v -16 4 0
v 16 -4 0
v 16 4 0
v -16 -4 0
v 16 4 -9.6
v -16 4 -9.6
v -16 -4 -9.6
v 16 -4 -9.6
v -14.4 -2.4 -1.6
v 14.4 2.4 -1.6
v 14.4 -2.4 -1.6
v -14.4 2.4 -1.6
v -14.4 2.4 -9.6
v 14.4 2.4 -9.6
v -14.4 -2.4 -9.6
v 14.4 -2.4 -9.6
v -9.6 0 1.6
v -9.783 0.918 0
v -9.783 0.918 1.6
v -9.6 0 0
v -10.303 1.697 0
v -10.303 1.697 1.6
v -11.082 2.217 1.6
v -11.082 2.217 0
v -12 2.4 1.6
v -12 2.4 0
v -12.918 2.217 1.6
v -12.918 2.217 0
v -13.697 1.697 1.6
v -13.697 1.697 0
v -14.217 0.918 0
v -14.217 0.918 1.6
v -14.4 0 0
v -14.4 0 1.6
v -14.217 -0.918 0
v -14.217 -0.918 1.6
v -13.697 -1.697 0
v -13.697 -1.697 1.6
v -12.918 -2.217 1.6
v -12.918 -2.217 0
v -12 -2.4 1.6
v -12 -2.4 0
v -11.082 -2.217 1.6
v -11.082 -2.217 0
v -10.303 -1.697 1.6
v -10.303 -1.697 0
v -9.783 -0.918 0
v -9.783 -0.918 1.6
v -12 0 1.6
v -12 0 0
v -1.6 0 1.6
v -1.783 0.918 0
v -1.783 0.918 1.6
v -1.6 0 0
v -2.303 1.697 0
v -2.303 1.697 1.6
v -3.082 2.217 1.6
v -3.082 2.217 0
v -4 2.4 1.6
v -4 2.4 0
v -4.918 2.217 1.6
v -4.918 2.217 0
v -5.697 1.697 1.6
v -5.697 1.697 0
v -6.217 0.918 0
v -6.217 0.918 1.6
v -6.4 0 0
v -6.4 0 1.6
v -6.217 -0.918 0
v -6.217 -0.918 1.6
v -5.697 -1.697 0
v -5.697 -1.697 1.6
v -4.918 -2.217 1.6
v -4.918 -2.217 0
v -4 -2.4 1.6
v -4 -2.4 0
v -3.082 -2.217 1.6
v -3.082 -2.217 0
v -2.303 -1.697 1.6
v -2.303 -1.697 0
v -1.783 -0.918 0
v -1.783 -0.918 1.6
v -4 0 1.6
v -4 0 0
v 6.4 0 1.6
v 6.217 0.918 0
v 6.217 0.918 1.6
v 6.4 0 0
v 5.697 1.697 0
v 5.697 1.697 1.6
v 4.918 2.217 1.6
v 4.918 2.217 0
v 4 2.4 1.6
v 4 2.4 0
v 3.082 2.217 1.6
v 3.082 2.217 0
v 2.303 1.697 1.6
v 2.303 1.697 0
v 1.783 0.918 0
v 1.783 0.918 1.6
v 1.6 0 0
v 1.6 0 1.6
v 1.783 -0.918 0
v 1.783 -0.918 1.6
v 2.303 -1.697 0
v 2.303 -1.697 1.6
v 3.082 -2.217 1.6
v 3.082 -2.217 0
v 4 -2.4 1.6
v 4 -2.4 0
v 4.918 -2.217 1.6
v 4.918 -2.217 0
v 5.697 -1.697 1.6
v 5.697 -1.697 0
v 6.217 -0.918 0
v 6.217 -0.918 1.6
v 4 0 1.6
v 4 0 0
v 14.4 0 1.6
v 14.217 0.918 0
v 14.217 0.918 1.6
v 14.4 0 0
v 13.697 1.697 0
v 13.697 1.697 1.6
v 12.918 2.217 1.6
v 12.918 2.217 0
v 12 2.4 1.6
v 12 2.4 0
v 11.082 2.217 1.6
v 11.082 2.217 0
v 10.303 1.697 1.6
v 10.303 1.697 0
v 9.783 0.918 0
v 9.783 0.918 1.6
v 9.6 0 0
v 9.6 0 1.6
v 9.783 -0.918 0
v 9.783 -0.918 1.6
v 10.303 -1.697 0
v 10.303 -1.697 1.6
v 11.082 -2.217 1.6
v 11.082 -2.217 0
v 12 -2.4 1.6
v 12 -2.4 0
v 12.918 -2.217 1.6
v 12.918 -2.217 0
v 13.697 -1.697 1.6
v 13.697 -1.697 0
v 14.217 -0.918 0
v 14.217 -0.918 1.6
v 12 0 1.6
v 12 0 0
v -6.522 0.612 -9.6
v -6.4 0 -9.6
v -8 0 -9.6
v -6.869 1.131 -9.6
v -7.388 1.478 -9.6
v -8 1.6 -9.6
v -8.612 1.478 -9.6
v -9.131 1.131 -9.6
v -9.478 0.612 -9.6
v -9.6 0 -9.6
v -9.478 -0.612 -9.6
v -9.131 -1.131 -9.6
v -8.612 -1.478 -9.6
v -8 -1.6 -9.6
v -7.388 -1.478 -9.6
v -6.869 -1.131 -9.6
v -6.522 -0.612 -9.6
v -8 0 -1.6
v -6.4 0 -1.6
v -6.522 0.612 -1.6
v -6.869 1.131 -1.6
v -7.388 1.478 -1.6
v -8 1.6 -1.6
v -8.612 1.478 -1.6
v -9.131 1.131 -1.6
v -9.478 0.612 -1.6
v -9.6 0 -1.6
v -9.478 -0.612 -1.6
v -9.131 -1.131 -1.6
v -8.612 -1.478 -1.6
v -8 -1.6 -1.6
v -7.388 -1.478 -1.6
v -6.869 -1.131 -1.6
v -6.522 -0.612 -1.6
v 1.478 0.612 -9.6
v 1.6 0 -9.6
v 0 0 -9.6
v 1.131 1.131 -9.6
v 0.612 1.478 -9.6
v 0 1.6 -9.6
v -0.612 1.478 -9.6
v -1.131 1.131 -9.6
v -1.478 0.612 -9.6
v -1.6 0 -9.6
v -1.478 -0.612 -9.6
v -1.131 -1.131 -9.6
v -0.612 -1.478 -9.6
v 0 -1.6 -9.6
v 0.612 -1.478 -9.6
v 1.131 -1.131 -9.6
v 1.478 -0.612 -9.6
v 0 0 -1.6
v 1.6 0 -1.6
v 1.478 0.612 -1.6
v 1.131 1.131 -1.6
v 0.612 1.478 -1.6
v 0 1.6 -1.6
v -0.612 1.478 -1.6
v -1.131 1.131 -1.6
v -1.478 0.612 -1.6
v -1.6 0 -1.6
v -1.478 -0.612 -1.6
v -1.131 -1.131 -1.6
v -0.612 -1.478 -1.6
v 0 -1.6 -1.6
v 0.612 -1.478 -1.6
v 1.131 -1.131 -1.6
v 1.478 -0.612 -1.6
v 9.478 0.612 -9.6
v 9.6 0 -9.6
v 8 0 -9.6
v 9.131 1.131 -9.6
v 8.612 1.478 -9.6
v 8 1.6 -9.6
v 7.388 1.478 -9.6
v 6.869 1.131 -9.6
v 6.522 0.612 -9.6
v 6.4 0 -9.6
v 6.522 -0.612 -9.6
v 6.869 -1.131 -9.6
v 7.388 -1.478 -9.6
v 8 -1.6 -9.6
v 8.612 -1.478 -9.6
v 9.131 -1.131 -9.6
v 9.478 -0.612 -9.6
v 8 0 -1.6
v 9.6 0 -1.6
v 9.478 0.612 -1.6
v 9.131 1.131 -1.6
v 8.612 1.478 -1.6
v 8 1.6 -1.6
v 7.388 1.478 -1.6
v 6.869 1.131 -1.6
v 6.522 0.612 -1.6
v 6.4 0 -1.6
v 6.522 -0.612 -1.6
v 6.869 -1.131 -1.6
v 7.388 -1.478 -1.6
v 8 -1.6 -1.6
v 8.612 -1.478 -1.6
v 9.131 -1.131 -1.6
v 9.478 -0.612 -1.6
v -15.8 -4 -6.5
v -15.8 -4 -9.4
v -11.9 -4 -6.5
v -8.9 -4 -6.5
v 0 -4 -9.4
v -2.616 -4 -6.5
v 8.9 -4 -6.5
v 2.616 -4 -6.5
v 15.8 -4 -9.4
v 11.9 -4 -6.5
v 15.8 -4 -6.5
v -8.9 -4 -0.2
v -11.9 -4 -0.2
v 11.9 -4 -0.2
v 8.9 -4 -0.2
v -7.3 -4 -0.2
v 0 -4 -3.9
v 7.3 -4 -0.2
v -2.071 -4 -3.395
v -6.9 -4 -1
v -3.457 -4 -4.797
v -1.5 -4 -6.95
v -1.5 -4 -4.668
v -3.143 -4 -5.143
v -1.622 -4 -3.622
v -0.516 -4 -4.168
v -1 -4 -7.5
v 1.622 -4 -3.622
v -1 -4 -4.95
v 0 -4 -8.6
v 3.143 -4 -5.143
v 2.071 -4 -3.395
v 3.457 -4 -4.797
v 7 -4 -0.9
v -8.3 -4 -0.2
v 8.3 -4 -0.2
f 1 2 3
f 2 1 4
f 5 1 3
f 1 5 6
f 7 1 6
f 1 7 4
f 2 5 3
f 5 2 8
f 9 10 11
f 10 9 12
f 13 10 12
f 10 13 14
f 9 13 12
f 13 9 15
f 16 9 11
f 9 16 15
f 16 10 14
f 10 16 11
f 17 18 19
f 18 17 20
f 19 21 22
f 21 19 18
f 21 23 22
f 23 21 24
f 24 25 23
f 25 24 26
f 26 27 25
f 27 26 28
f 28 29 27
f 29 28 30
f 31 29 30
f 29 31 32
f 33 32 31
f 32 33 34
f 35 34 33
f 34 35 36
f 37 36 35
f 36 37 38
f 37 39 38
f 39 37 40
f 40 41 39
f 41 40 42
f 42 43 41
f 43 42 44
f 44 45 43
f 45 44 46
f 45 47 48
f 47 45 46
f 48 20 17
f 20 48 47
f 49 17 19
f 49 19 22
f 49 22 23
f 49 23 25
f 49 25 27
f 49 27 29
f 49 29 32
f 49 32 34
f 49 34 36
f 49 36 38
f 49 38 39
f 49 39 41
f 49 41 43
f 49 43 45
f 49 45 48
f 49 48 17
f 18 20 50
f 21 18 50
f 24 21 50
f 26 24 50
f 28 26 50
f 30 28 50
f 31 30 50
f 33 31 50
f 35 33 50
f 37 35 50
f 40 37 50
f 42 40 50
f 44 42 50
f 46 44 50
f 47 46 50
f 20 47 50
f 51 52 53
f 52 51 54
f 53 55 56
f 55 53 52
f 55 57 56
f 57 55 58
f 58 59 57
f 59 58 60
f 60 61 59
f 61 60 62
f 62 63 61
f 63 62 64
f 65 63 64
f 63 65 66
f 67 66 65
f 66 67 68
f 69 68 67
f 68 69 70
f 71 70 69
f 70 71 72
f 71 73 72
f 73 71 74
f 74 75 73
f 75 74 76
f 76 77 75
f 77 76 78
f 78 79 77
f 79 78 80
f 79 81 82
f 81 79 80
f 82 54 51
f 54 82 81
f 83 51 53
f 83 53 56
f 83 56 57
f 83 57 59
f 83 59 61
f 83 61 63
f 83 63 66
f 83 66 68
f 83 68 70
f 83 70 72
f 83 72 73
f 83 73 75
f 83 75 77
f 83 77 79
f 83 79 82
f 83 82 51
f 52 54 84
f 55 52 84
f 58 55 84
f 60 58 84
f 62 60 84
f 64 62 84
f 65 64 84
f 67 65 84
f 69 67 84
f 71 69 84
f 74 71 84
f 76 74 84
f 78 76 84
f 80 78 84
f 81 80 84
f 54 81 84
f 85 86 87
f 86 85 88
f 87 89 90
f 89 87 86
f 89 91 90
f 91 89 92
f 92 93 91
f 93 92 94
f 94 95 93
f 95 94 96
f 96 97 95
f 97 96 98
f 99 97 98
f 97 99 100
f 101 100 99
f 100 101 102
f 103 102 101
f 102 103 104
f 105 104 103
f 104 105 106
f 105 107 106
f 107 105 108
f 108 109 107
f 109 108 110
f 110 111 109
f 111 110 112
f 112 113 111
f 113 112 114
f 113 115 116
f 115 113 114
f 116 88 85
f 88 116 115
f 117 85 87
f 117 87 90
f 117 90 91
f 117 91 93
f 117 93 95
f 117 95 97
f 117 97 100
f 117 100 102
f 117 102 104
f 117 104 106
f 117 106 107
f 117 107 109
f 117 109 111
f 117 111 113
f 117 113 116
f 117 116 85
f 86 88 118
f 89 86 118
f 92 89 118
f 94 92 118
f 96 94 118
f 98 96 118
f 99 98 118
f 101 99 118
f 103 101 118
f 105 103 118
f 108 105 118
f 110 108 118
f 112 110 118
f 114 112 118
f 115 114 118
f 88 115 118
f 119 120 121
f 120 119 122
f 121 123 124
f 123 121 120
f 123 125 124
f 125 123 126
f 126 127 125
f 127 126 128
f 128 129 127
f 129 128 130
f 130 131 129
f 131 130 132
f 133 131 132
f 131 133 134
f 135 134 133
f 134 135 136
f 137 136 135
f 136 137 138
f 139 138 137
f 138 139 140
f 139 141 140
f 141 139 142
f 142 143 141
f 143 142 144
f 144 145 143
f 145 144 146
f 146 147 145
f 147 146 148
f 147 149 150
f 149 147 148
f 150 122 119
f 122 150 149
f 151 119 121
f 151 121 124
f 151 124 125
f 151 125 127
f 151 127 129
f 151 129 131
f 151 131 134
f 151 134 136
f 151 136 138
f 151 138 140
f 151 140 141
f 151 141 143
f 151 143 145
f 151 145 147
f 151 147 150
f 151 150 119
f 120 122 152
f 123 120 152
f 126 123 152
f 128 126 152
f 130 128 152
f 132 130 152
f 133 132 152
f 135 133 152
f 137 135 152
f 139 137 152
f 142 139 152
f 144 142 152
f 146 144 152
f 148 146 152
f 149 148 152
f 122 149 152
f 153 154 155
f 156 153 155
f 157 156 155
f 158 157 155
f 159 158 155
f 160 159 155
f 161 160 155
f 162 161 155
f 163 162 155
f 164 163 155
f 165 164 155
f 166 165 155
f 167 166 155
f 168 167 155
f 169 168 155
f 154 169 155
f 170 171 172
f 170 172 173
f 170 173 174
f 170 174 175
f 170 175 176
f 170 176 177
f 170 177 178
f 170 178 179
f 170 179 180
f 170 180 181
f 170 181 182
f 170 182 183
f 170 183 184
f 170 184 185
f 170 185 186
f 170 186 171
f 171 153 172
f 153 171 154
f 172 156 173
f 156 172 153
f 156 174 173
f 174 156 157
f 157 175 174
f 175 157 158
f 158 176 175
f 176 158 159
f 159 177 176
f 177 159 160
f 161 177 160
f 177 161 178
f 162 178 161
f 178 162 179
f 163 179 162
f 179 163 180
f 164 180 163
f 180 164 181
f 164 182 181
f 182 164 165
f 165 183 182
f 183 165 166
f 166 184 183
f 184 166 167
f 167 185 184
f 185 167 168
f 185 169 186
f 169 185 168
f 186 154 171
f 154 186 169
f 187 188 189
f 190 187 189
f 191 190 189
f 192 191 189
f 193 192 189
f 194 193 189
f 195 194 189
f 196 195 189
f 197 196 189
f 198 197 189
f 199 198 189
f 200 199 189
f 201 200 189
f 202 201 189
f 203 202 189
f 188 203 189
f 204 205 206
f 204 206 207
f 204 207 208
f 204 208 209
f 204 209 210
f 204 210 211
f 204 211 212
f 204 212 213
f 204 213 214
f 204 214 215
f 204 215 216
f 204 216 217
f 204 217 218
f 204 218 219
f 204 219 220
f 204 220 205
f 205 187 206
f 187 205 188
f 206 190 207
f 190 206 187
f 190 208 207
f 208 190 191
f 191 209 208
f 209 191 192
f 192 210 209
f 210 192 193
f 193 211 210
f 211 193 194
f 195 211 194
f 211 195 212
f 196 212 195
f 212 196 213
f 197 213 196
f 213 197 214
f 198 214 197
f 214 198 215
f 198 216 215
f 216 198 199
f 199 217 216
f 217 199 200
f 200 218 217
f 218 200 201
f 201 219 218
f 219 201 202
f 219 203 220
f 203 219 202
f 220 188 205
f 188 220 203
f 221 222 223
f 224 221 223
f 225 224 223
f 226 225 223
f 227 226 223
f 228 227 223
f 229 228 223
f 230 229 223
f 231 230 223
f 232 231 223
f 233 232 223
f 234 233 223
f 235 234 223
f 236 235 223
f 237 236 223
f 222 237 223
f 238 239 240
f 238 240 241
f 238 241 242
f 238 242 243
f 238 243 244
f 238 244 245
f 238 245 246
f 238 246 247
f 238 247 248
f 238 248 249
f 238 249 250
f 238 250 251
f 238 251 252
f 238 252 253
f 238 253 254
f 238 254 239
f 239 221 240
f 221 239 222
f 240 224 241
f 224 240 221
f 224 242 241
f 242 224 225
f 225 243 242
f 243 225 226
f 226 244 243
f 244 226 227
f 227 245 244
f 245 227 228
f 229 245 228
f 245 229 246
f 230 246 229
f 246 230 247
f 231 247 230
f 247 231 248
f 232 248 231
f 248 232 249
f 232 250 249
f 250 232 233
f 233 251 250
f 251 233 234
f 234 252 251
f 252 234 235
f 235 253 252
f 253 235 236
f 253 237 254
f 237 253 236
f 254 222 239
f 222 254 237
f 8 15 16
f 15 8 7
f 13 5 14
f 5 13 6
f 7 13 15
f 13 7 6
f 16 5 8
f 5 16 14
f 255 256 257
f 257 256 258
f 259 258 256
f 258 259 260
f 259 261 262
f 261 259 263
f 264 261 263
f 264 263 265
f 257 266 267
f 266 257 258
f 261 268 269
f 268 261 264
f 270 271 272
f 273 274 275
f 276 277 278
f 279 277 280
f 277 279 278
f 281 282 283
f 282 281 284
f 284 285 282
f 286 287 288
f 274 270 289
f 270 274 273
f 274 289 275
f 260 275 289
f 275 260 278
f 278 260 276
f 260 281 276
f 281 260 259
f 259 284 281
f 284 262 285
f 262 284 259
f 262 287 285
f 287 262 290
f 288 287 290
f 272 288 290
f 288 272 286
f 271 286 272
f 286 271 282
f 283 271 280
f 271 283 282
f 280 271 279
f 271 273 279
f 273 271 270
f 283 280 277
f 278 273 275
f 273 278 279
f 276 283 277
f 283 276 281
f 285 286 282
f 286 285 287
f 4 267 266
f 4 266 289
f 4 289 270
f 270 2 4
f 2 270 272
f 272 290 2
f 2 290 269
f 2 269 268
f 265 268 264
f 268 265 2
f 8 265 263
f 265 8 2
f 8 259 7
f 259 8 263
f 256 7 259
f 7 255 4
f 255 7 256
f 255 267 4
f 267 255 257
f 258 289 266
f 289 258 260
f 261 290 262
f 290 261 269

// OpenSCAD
// file: ../p/4-4edge.scad
use <../lib.scad>
function ldraw_lib__4_4edge() = [
// 0 Circle 1.0
// 0 Name: 4-4edge.dat
// 0 Author: James Jessiman
// 0 !LDRAW_ORG Primitive UPDATE 2017-01
// 0 !LICENSE Licensed under CC BY 2.0 and CC BY 4.0 : see CAreadme.txt
// 
// 0 BFC CERTIFY CCW
  [0,"BFC","CERTIFY"],
  [0,"BFC","CCW"],
// 
// 0 !HISTORY 1998-12-15 [PTadmin] Official Update 1998-10
// 0 !HISTORY 2005-12-28 [PTadmin] Official Update 2005-01
// 0 !HISTORY 2007-06-24 [PTadmin] Header formatted for Contributor Agreement
// 0 !HISTORY 2008-07-01 [PTadmin] Official Update 2008-01
// 0 !HISTORY 2017-01-15 [Steffen] BFCed
// 0 !HISTORY 2017-12-30 [PTadmin] Official Update 2017-01
// 
// 
// 2 24 1 0 0 0.9239 0 0.3827
  [2,24,1,0,0,0.9239,0,0.3827],
// 2 24 0.9239 0 0.3827 0.7071 0 0.7071
  [2,24,0.9239,0,0.3827,0.7071,0,0.7071],
// 2 24 0.7071 0 0.7071 0.3827 0 0.9239
  [2,24,0.7071,0,0.7071,0.3827,0,0.9239],
// 2 24 0.3827 0 0.9239 0 0 1
  [2,24,0.3827,0,0.9239,0,0,1],
// 2 24 0 0 1 -0.3827 0 0.9239
  [2,24,0,0,1,-0.3827,0,0.9239],
// 2 24 -0.3827 0 0.9239 -0.7071 0 0.7071
  [2,24,-0.3827,0,0.9239,-0.7071,0,0.7071],
// 2 24 -0.7071 0 0.7071 -0.9239 0 0.3827
  [2,24,-0.7071,0,0.7071,-0.9239,0,0.3827],
// 2 24 -0.9239 0 0.3827 -1 0 -0
  [2,24,-0.9239,0,0.3827,-1,0,-0],
// 2 24 -1 0 -0 -0.9239 0 -0.3827
  [2,24,-1,0,-0,-0.9239,0,-0.3827],
// 2 24 -0.9239 0 -0.3827 -0.7071 0 -0.7071
  [2,24,-0.9239,0,-0.3827,-0.7071,0,-0.7071],
// 2 24 -0.7071 0 -0.7071 -0.3827 0 -0.9239
  [2,24,-0.7071,0,-0.7071,-0.3827,0,-0.9239],
// 2 24 -0.3827 0 -0.9239 0 0 -1
  [2,24,-0.3827,0,-0.9239,0,0,-1],
// 2 24 0 0 -1 0.3827 0 -0.9239
  [2,24,0,0,-1,0.3827,0,-0.9239],
// 2 24 0.3827 0 -0.9239 0.7071 0 -0.7071
  [2,24,0.3827,0,-0.9239,0.7071,0,-0.7071],
// 2 24 0.7071 0 -0.7071 0.9239 0 -0.3827
  [2,24,0.7071,0,-0.7071,0.9239,0,-0.3827],
// 2 24 0.9239 0 -0.3827 1 0 0
  [2,24,0.9239,0,-0.3827,1,0,0],
];
module ldraw_lib__4_4edge(step=0, col=false, unit=2/5, alt=false, line=0.2, solid=!$preview)
    makepoly(ldraw_lib__4_4edge(), step=step, col=col, unit=unit, alt=alt, line=line, solid=solid);
ldraw_lib__4_4edge(line=0.2);
// file: ../p/4-4disc.scad
use <../lib.scad>
function ldraw_lib__4_4disc() = [
// 0 Disc 1.0
// 0 Name: 4-4disc.dat
// 0 Author: James Jessiman
// 0 !LDRAW_ORG Primitive UPDATE 2002-02
// 0 !LICENSE Licensed under CC BY 2.0 and CC BY 4.0 : see CAreadme.txt
// 
// 0 BFC CERTIFY CCW
  [0,"BFC","CERTIFY"],
  [0,"BFC","CCW"],
// 
// 0 !HISTORY 1998-12-15 [PTadmin] Official Update 1998-10
// 0 !HISTORY 2002-03-23 [sbliss] Added BFC statement
// 0 !HISTORY 2002-04-25 [PTadmin] Official Update 2002-02
// 0 !HISTORY 2007-06-24 [PTadmin] Header formatted for Contributor Agreement
// 0 !HISTORY 2008-07-01 [PTadmin] Official Update 2008-01
// 
// 
// 3 16 0 0 0 1 0 0 0.9239 0 0.3827
  [3,16,0,0,0,1,0,0,0.9239,0,0.3827],
// 3 16 0 0 0 0.9239 0 0.3827 0.7071 0 0.7071
  [3,16,0,0,0,0.9239,0,0.3827,0.7071,0,0.7071],
// 3 16 0 0 0 0.7071 0 0.7071 0.3827 0 0.9239
  [3,16,0,0,0,0.7071,0,0.7071,0.3827,0,0.9239],
// 3 16 0 0 0 0.3827 0 0.9239 0 0 1
  [3,16,0,0,0,0.3827,0,0.9239,0,0,1],
// 3 16 0 0 0 0 0 1 -0.3827 0 0.9239
  [3,16,0,0,0,0,0,1,-0.3827,0,0.9239],
// 3 16 0 0 0 -0.3827 0 0.9239 -0.7071 0 0.7071
  [3,16,0,0,0,-0.3827,0,0.9239,-0.7071,0,0.7071],
// 3 16 0 0 0 -0.7071 0 0.7071 -0.9239 0 0.3827
  [3,16,0,0,0,-0.7071,0,0.7071,-0.9239,0,0.3827],
// 3 16 0 0 0 -0.9239 0 0.3827 -1 0 -0
  [3,16,0,0,0,-0.9239,0,0.3827,-1,0,-0],
// 3 16 0 0 0 -1 0 -0 -0.9239 0 -0.3827
  [3,16,0,0,0,-1,0,-0,-0.9239,0,-0.3827],
// 3 16 0 0 0 -0.9239 0 -0.3827 -0.7071 0 -0.7071
  [3,16,0,0,0,-0.9239,0,-0.3827,-0.7071,0,-0.7071],
// 3 16 0 0 0 -0.7071 0 -0.7071 -0.3827 0 -0.9239
  [3,16,0,0,0,-0.7071,0,-0.7071,-0.3827,0,-0.9239],
// 3 16 0 0 0 -0.3827 0 -0.9239 0 0 -1
  [3,16,0,0,0,-0.3827,0,-0.9239,0,0,-1],
// 3 16 0 0 0 0 0 -1 0.3827 0 -0.9239
  [3,16,0,0,0,0,0,-1,0.3827,0,-0.9239],
// 3 16 0 0 0 0.3827 0 -0.9239 0.7071 0 -0.7071
  [3,16,0,0,0,0.3827,0,-0.9239,0.7071,0,-0.7071],
// 3 16 0 0 0 0.7071 0 -0.7071 0.9239 0 -0.3827
  [3,16,0,0,0,0.7071,0,-0.7071,0.9239,0,-0.3827],
// 3 16 0 0 0 0.9239 0 -0.3827 1 0 0
  [3,16,0,0,0,0.9239,0,-0.3827,1,0,0],
// 0
];
module ldraw_lib__4_4disc(step=0, col=false, unit=2/5, alt=false, line=0.2, solid=!$preview)
    makepoly(ldraw_lib__4_4disc(), step=step, col=col, unit=unit, alt=alt, line=line, solid=solid);
ldraw_lib__4_4disc(line=0.2);
// file: ../p/4-4cyli.scad
use <../lib.scad>
$fa=1; $fs=0.2;
function ldraw_lib__4_4cyli(realsolid=false) = [
// 0 Cylinder 1.0
// 0 Name: 4-4cyli.dat
// 0 Author: James Jessiman
// 0 !LDRAW_ORG Primitive UPDATE 2005-01
// 0 !LICENSE Licensed under CC BY 2.0 and CC BY 4.0 : see CAreadme.txt
// 
// 0 BFC CERTIFY CCW
  [0,"BFC","CERTIFY"],
  [0,"BFC","CCW"],
// 
// 0 !HISTORY 1998-12-15 [PTadmin] Official Update 1998-10
// 0 !HISTORY 2002-03-23 [sbliss] Added BFC statement; merged headers from files in distributions LDraw 0.27 and Complete.
// 0 !HISTORY 2002-04-25 [PTadmin] Official Update 2002-02
// 0 !HISTORY 2004-12-14 [guyvivan] BFC CCW
// 0 !HISTORY 2005-12-28 [PTadmin] Official Update 2005-01
// 0 !HISTORY 2007-06-24 [PTadmin] Header formatted for Contributor Agreement
// 0 !HISTORY 2008-07-01 [PTadmin] Official Update 2008-01
// 
// 
// 4 16 1 1 0 0.9239 1 0.3827 0.9239 0 0.3827 1 0 0
  [4,16,1,1,0,0.9239,1,0.3827,0.9239,0,0.3827,1,0,0],
// 5 24 1 0 0 1 1 0 0.9239 0 0.3827 0.9239 0 -0.3827
  [5,24,1,0,0,1,1,0,0.9239,0,0.3827,0.9239,0,-0.3827],
// 4 16 0.9239 1 0.3827 0.7071 1 0.7071 0.7071 0 0.7071 0.9239 0 0.3827
  [4,16,0.9239,1,0.3827,0.7071,1,0.7071,0.7071,0,0.7071,0.9239,0,0.3827],
// 5 24 0.9239 0 0.3827 0.9239 1 0.3827 0.7071 0 0.7071 1 0 0
  [5,24,0.9239,0,0.3827,0.9239,1,0.3827,0.7071,0,0.7071,1,0,0],
// 4 16 0.7071 1 0.7071 0.3827 1 0.9239 0.3827 0 0.9239 0.7071 0 0.7071
  [4,16,0.7071,1,0.7071,0.3827,1,0.9239,0.3827,0,0.9239,0.7071,0,0.7071],
// 5 24 0.7071 0 0.7071 0.7071 1 0.7071 0.3827 0 0.9239 0.9239 0 0.3827
  [5,24,0.7071,0,0.7071,0.7071,1,0.7071,0.3827,0,0.9239,0.9239,0,0.3827],
// 4 16 0.3827 1 0.9239 0 1 1 0 0 1 0.3827 0 0.9239
  [4,16,0.3827,1,0.9239,0,1,1,0,0,1,0.3827,0,0.9239],
// 5 24 0.3827 0 0.9239 0.3827 1 0.9239 0 0 1 0.7071 0 0.7071
  [5,24,0.3827,0,0.9239,0.3827,1,0.9239,0,0,1,0.7071,0,0.7071],
// 4 16 0 1 1 -0.3827 1 0.9239 -0.3827 0 0.9239 0 0 1
  [4,16,0,1,1,-0.3827,1,0.9239,-0.3827,0,0.9239,0,0,1],
// 5 24 0 0 1 0 1 1 -0.3827 0 0.9239 0.3827 0 0.9239
  [5,24,0,0,1,0,1,1,-0.3827,0,0.9239,0.3827,0,0.9239],
// 4 16 -0.3827 1 0.9239 -0.7071 1 0.7071 -0.7071 0 0.7071 -0.3827 0 0.9239
  [4,16,-0.3827,1,0.9239,-0.7071,1,0.7071,-0.7071,0,0.7071,-0.3827,0,0.9239],
// 5 24 -0.3827 0 0.9239 -0.3827 1 0.9239 -0.7071 0 0.7071 0 0 1
  [5,24,-0.3827,0,0.9239,-0.3827,1,0.9239,-0.7071,0,0.7071,0,0,1],
// 4 16 -0.7071 1 0.7071 -0.9239 1 0.3827 -0.9239 0 0.3827 -0.7071 0 0.7071
  [4,16,-0.7071,1,0.7071,-0.9239,1,0.3827,-0.9239,0,0.3827,-0.7071,0,0.7071],
// 5 24 -0.7071 0 0.7071 -0.7071 1 0.7071 -0.9239 0 0.3827 -0.3827 0 0.9239
  [5,24,-0.7071,0,0.7071,-0.7071,1,0.7071,-0.9239,0,0.3827,-0.3827,0,0.9239],
// 4 16 -0.9239 1 0.3827 -1 1 0 -1 0 0 -0.9239 0 0.3827
  [4,16,-0.9239,1,0.3827,-1,1,0,-1,0,0,-0.9239,0,0.3827],
// 5 24 -0.9239 0 0.3827 -0.9239 1 0.3827 -1 0 0 -0.7071 0 0.7071
  [5,24,-0.9239,0,0.3827,-0.9239,1,0.3827,-1,0,0,-0.7071,0,0.7071],
// 4 16 -1 1 0 -0.9239 1 -0.3827 -0.9239 0 -0.3827 -1 0 0
  [4,16,-1,1,0,-0.9239,1,-0.3827,-0.9239,0,-0.3827,-1,0,0],
// 5 24 -1 0 0 -1 1 0 -0.9239 0 -0.3827 -0.9239 0 0.3827
  [5,24,-1,0,0,-1,1,0,-0.9239,0,-0.3827,-0.9239,0,0.3827],
// 4 16 -0.9239 1 -0.3827 -0.7071 1 -0.7071 -0.7071 0 -0.7071 -0.9239 0 -0.3827
  [4,16,-0.9239,1,-0.3827,-0.7071,1,-0.7071,-0.7071,0,-0.7071,-0.9239,0,-0.3827],
// 5 24 -0.9239 0 -0.3827 -0.9239 1 -0.3827 -0.7071 0 -0.7071 -1 0 0
  [5,24,-0.9239,0,-0.3827,-0.9239,1,-0.3827,-0.7071,0,-0.7071,-1,0,0],
// 4 16 -0.7071 1 -0.7071 -0.3827 1 -0.9239 -0.3827 0 -0.9239 -0.7071 0 -0.7071
  [4,16,-0.7071,1,-0.7071,-0.3827,1,-0.9239,-0.3827,0,-0.9239,-0.7071,0,-0.7071],
// 5 24 -0.7071 0 -0.7071 -0.7071 1 -0.7071 -0.3827 0 -0.9239 -0.9239 0 -0.3827
  [5,24,-0.7071,0,-0.7071,-0.7071,1,-0.7071,-0.3827,0,-0.9239,-0.9239,0,-0.3827],
// 4 16 -0.3827 1 -0.9239 0 1 -1 0 0 -1 -0.3827 0 -0.9239
  [4,16,-0.3827,1,-0.9239,0,1,-1,0,0,-1,-0.3827,0,-0.9239],
// 5 24 -0.3827 0 -0.9239 -0.3827 1 -0.9239 0 0 -1 -0.7071 0 -0.7071
  [5,24,-0.3827,0,-0.9239,-0.3827,1,-0.9239,0,0,-1,-0.7071,0,-0.7071],
// 4 16 0 1 -1 0.3827 1 -0.9239 0.3827 0 -0.9239 0 0 -1
  [4,16,0,1,-1,0.3827,1,-0.9239,0.3827,0,-0.9239,0,0,-1],
// 5 24 0 0 -1 0 1 -1 0.3827 0 -0.9239 -0.3827 0 -0.9239
  [5,24,0,0,-1,0,1,-1,0.3827,0,-0.9239,-0.3827,0,-0.9239],
// 4 16 0.3827 1 -0.9239 0.7071 1 -0.7071 0.7071 0 -0.7071 0.3827 0 -0.9239
  [4,16,0.3827,1,-0.9239,0.7071,1,-0.7071,0.7071,0,-0.7071,0.3827,0,-0.9239],
// 5 24 0.3827 0 -0.9239 0.3827 1 -0.9239 0.7071 0 -0.7071 0 0 -1
  [5,24,0.3827,0,-0.9239,0.3827,1,-0.9239,0.7071,0,-0.7071,0,0,-1],
// 4 16 0.7071 1 -0.7071 0.9239 1 -0.3827 0.9239 0 -0.3827 0.7071 0 -0.7071
  [4,16,0.7071,1,-0.7071,0.9239,1,-0.3827,0.9239,0,-0.3827,0.7071,0,-0.7071],
// 5 24 0.7071 0 -0.7071 0.7071 1 -0.7071 0.9239 0 -0.3827 0.3827 0 -0.9239
  [5,24,0.7071,0,-0.7071,0.7071,1,-0.7071,0.9239,0,-0.3827,0.3827,0,-0.9239],
// 4 16 0.9239 1 -0.3827 1 1 0 1 0 0 0.9239 0 -0.3827
  [4,16,0.9239,1,-0.3827,1,1,0,1,0,0,0.9239,0,-0.3827],
// 5 24 0.9239 0 -0.3827 0.9239 1 -0.3827 1 0 0 0.7071 0 -0.7071
  [5,24,0.9239,0,-0.3827,0.9239,1,-0.3827,1,0,0,0.7071,0,-0.7071],
// 0
];
module ldraw_lib__4_4cyli(step=0, col=false, unit=2/5, alt=false, line=0.2, solid=!$preview)
    makepoly(ldraw_lib__4_4cyli(solid), step=step, col=col, unit=unit, alt=alt, line=line, solid=solid);
ldraw_lib__4_4cyli(line=0.2);
// file: ../p/stud3.scad
use <../lib.scad>
use <4-4cyli.scad>
use <4-4disc.scad>
use <4-4edge.scad>
function ldraw_lib__stud3() = [
// 0 Stud Tube Solid
// 0 Name: stud3.dat
// 0 Author: James Jessiman
// 0 !LDRAW_ORG Primitive UPDATE 2012-01
// 0 !LICENSE Licensed under CC BY 4.0 : see CAreadme.txt
// 
// 0 BFC CERTIFY CCW
  [0,"BFC","CERTIFY"],
  [0,"BFC","CCW"],
// 
// 0 !HISTORY 2002-04-04 [sbliss] Modified for BFC compliance
// 0 !HISTORY 2002-04-25 [PTadmin] Official Update 2002-02
// 0 !HISTORY 2007-06-24 [PTadmin] Header formatted for Contributor Agreement
// 0 !HISTORY 2008-07-01 [PTadmin] Official Update 2008-01
// 0 !HISTORY 2012-02-16 [Philo] Changed to CCW
// 0 !HISTORY 2012-03-30 [PTadmin] Official Update 2012-01
// 
// 
// 1 16 0 -4 0 4 0 0 0 1 0 0 0 4 4-4edge.dat
  [1,16,0,-4,0,4,0,0,0,1,0,0,0,4, ldraw_lib__4_4edge()],
// 1 16 0 0 0 4 0 0 0 1 0 0 0 4 4-4edge.dat
  [1,16,0,0,0,4,0,0,0,1,0,0,0,4, ldraw_lib__4_4edge()],
// 1 16 0 -4 0 4 0 0 0 1 0 0 0 4 4-4disc.dat
  [1,16,0,-4,0,4,0,0,0,1,0,0,0,4, ldraw_lib__4_4disc()],
  [-1,16,0,0,0,4,0,0,0,-1,0,0,0,4, ldraw_lib__4_4disc()],
// 1 16 0 -4 0 4 0 0 0 4 0 0 0 4 4-4cyli.dat
  [1,16,0,-4,0,4,0,0,0,4,0,0,0,4, ldraw_lib__4_4cyli()],
];
module ldraw_lib__stud3(step=0, col=false, unit=2/5, alt=false, line=0.2, solid=!$preview)
    makepoly(ldraw_lib__stud3(), step=step, col=col, unit=unit, alt=alt, line=line, solid=solid);
ldraw_lib__stud3(line=0.2);
// file: ../p/stud.scad
use <../lib.scad>
use <4-4cyli.scad>
use <4-4disc.scad>
use <4-4edge.scad>
function ldraw_lib__stud() = [
// 0 Stud
// 0 Name: stud.dat
// 0 Author: James Jessiman
// 0 !LDRAW_ORG Primitive UPDATE 2012-01
// 0 !LICENSE Licensed under CC BY 4.0 : see CAreadme.txt
// 
// 0 BFC CERTIFY CCW
  [0,"BFC","CERTIFY"],
  [0,"BFC","CCW"],
// 
// 0 !HISTORY 2002-04-04 [sbliss] Modified for BFC compliance
// 0 !HISTORY 2002-04-25 [PTadmin] Official Update 2002-02
// 0 !HISTORY 2007-06-24 [PTadmin] Header formatted for Contributor Agreement
// 0 !HISTORY 2008-07-01 [PTadmin] Official Update 2008-01
// 0 !HISTORY 2012-02-16 [Philo] Changed to CCW
// 0 !HISTORY 2012-03-30 [PTadmin] Official Update 2012-01
// 
// 
// 1 16 0 0 0 6 0 0 0 1 0 0 0 6 4-4edge.dat
  [1,16,0,0,0,6,0,0,0,1,0,0,0,6, ldraw_lib__4_4edge()],
// 1 16 0 -4 0 6 0 0 0 1 0 0 0 6 4-4edge.dat
  [1,16,0,-4,0,6,0,0,0,1,0,0,0,6, ldraw_lib__4_4edge()],
// 1 16 0 0 0 6 0 0 0 -4 0 0 0 6 4-4cyli.dat
  [1,16,0,0,0,6,0,0,0,-4,0,0,0,6, ldraw_lib__4_4cyli()],
// 1 16 0 -4 0 6 0 0 0 1 0 0 0 6 4-4disc.dat
  [1,16,0,-4,0,6,0,0,0,1,0,0,0,6, ldraw_lib__4_4disc()],
  [-1,16,0,0,0,6,0,0,0,-1,0,0,0,6, ldraw_lib__4_4disc()],
];
module ldraw_lib__stud(step=0, col=false, unit=2/5, alt=false, line=0.2, solid=!$preview)
    makepoly(ldraw_lib__stud(), step=step, col=col, unit=unit, alt=alt, line=line, solid=solid);
ldraw_lib__stud(line=0.2);
// file: ../p/box5.scad
use <../lib.scad>
function ldraw_lib__box5() = [
// 0 Box with 5 Faces and All Edges
// 0 Name: box5.dat
// 0 Author: James Jessiman
// 0 !LDRAW_ORG Primitive UPDATE 2012-01
// 0 !LICENSE Licensed under CC BY 2.0 and CC BY 4.0 : see CAreadme.txt
// 
// 0 BFC CERTIFY CCW
  [0,"BFC","CERTIFY"],
  [0,"BFC","CCW"],
// 
// 0 !HISTORY 2002-04-03 [sbliss] Modified for BFC compliance
// 0 !HISTORY 2002-04-25 [PTadmin] Official Update 2002-02
// 0 !HISTORY 2007-06-24 [PTadmin] Header formatted for Contributor Agreement
// 0 !HISTORY 2008-07-01 [PTadmin] Official Update 2008-01
// 0 !HISTORY 2012-02-16 [Philo] Changed to CCW
// 0 !HISTORY 2012-03-30 [PTadmin] Official Update 2012-01
// 
// 
// 2 24 1 1 1 -1 1 1
  [2,24,1,1,1,-1,1,1],
// 2 24 -1 1 1 -1 1 -1
  [2,24,-1,1,1,-1,1,-1],
// 2 24 -1 1 -1 1 1 -1
  [2,24,-1,1,-1,1,1,-1],
// 2 24 1 1 -1 1 1 1
  [2,24,1,1,-1,1,1,1],
// 2 24 1 0 1 -1 0 1
  [2,24,1,0,1,-1,0,1],
// 2 24 -1 0 1 -1 0 -1
  [2,24,-1,0,1,-1,0,-1],
// 2 24 -1 0 -1 1 0 -1
  [2,24,-1,0,-1,1,0,-1],
// 2 24 1 0 -1 1 0 1
  [2,24,1,0,-1,1,0,1],
// 2 24 1 0 1 1 1 1
  [2,24,1,0,1,1,1,1],
// 2 24 -1 0 1 -1 1 1
  [2,24,-1,0,1,-1,1,1],
// 2 24 1 0 -1 1 1 -1
  [2,24,1,0,-1,1,1,-1],
// 2 24 -1 0 -1 -1 1 -1
  [2,24,-1,0,-1,-1,1,-1],
// 4 16 -1 1 1 1 1 1 1 1 -1 -1 1 -1
  [4,16,-1,1,1,1,1,1,1,1,-1,-1,1,-1],
// 4 16 -1 1 1 -1 0 1 1 0 1 1 1 1
  [4,16,-1,1,1,-1,0,1,1,0,1,1,1,1],
// 4 16 -1 1 -1 -1 0 -1 -1 0 1 -1 1 1
  [4,16,-1,1,-1,-1,0,-1,-1,0,1,-1,1,1],
// 4 16 1 1 -1 1 0 -1 -1 0 -1 -1 1 -1
  [4,16,1,1,-1,1,0,-1,-1,0,-1,-1,1,-1],
// 4 16 1 1 1 1 0 1 1 0 -1 1 1 -1
  [4,16,1,1,1,1,0,1,1,0,-1,1,1,-1],
];
makepoly(ldraw_lib__box5(), line=0.2);
// file: ../p/box4t.scad
use <../lib.scad>
function ldraw_lib__box4t() = [
// 0 Box with 4 Adjacent Faces and All Edges
// 0 Name: box4t.dat
// 0 Author: Tore Eriksson [Tore_Eriksson]
// 0 !LDRAW_ORG Primitive UPDATE 2003-02
// 0 !LICENSE Licensed under CC BY 2.0 and CC BY 4.0 : see CAreadme.txt
// 
// 0 BFC CERTIFY CCW
  [0,"BFC","CERTIFY"],
  [0,"BFC","CCW"],
// 
// 0 !HISTORY 1997-09-29 [PTadmin] Official Update 1997-15
// 0 !HISTORY 2002-08-31 [izanette] Modified with WINDZ for BFC compliance
// 0 !HISTORY 2003-08-01 [PTadmin] Official Update 2003-02
// 0 !HISTORY 2007-06-24 [PTadmin] Header formatted for Contributor Agreement
// 0 !HISTORY 2008-07-01 [PTadmin] Official Update 2008-01
// 
// 
// 2 24 1 1 1 -1 1 1
  [2,24,1,1,1,-1,1,1],
// 2 24 -1 1 1 -1 1 -1
  [2,24,-1,1,1,-1,1,-1],
// 2 24 -1 1 -1 1 1 -1
  [2,24,-1,1,-1,1,1,-1],
// 2 24 1 1 -1 1 1 1
  [2,24,1,1,-1,1,1,1],
// 2 24 1 0 1 -1 0 1
  [2,24,1,0,1,-1,0,1],
// 2 24 -1 0 1 -1 0 -1
  [2,24,-1,0,1,-1,0,-1],
// 2 24 -1 0 -1 1 0 -1
  [2,24,-1,0,-1,1,0,-1],
// 2 24 1 0 -1 1 0 1
  [2,24,1,0,-1,1,0,1],
// 2 24 1 0 1 1 1 1
  [2,24,1,0,1,1,1,1],
// 2 24 -1 0 1 -1 1 1
  [2,24,-1,0,1,-1,1,1],
// 2 24 1 0 -1 1 1 -1
  [2,24,1,0,-1,1,1,-1],
// 2 24 -1 0 -1 -1 1 -1
  [2,24,-1,0,-1,-1,1,-1],
// 4 16 1 1 1 1 1 -1 -1 1 -1 -1 1 1
  [4,16,1,1,1,1,1,-1,-1,1,-1,-1,1,1],
// 4 16 1 1 1 -1 1 1 -1 0 1 1 0 1
  [4,16,1,1,1,-1,1,1,-1,0,1,1,0,1],
// 4 16 -1 1 1 -1 1 -1 -1 0 -1 -1 0 1
  [4,16,-1,1,1,-1,1,-1,-1,0,-1,-1,0,1],
// 0 4 16 -1 1 -1 -1 0 -1 1 0 -1 1 1 -1
// 4 16 1 1 -1 1 1 1 1 0 1 1 0 -1
  [4,16,1,1,-1,1,1,1,1,0,1,1,0,-1],
// 0
];
makepoly(ldraw_lib__box4t(), line=0.2);
// file: s/3010s01.scad
use <../../lib.scad>
use <../../p/box4t.scad>
use <../../p/box5.scad>
use <../../p/stud.scad>
use <../../p/stud3.scad>
$fa=1; $fs=0.2;
function ldraw_lib__s__3010s01(realsolid=false) = [
// 0 ~Brick  1 x  4 without Front Face
// 0 Name: s\3010s01.dat
// 0 Author: Tony Hafner [hafhead]
// 0 !LDRAW_ORG Subpart UPDATE 2003-02
// 0 !LICENSE Licensed under CC BY 2.0 and CC BY 4.0 : see CAreadme.txt
// 
// 0 BFC CERTIFY CW
  [0,"BFC","CERTIFY"],
  [0,"BFC","CW"],
// 
// 0 !HISTORY 2003-08-01 [PTadmin] Official Update 2003-02
// 0 !HISTORY 2007-08-29 [PTadmin] Header formatted for Contributor Agreement
// 0 !HISTORY 2008-07-01 [PTadmin] Official Update 2008-01
// 
// 
// 1 16 0 24 0 40 0 0 0 -24 0 0 0 10 box4t.dat
  [1,16,0,24,0,40,0,0,0,-24,0,0,0,10, ldraw_lib__box4t(realsolid)],
// 0 BFC INVERTNEXT
  [0,"BFC","INVERTNEXT"],
// 1 16 0 24 0 36 0 0 0 -20 0 0 0 6 box5.dat
  [1,16,0,24,0,36,0,0,0,-20,0,0,0,6, ldraw_lib__box5(realsolid)],
// 1 16 -30 0 0 1 0 0 0 1 0 0 0 1 stud.dat
  [1,16,-30,0,0,1,0,0,0,1,0,0,0,1, ldraw_lib__stud(realsolid)],
// 1 16 -10 0 0 1 0 0 0 1 0 0 0 1 stud.dat
  [1,16,-10,0,0,1,0,0,0,1,0,0,0,1, ldraw_lib__stud(realsolid)],
// 1 16 10 0 0 1 0 0 0 1 0 0 0 1 stud.dat
  [1,16,10,0,0,1,0,0,0,1,0,0,0,1, ldraw_lib__stud(realsolid)],
// 1 16 30 0 0 1 0 0 0 1 0 0 0 1 stud.dat
  [1,16,30,0,0,1,0,0,0,1,0,0,0,1, ldraw_lib__stud(realsolid)],
// 1 16 -20 4 0 1 0 0 0 -5 0 0 0 1 stud3.dat
  [1,16,-20,4,0,1,0,0,0,-5,0,0,0,1, ldraw_lib__stud3(realsolid)],
// 1 16 0 4 0 1 0 0 0 -5 0 0 0 1 stud3.dat
  [1,16,0,4,0,1,0,0,0,-5,0,0,0,1, ldraw_lib__stud3(realsolid)],
// 1 16 20 4 0 1 0 0 0 -5 0 0 0 1 stud3.dat
  [1,16,20,4,0,1,0,0,0,-5,0,0,0,1, ldraw_lib__stud3(realsolid)],
// 4 16 -40 24 -10 40 24 -10 36 24 -6 -36 24 -6
  [4,16,-40,24,-10,40,24,-10,36,24,-6,-36,24,-6],
// 4 16 -40 24 10 -36 24 6 36 24 6 40 24 10
  [4,16,-40,24,10,-36,24,6,36,24,6,40,24,10],
// 4 16 -40 24 -10 -36 24 -6 -36 24 6 -40 24 10
  [4,16,-40,24,-10,-36,24,-6,-36,24,6,-40,24,10],
// 4 16 40 24 -10 40 24 10 36 24 6 36 24 -6
  [4,16,40,24,-10,40,24,10,36,24,6,36,24,-6],
// 0
];
module ldraw_lib__s__3010s01(step=0, col=false, unit=2/5, alt=false, line=0.2, solid=!$preview)
    makepoly(ldraw_lib__s__3010s01(solid), step=step, col=col, unit=unit, alt=alt, line=line, solid=solid);
ldraw_lib__s__3010s01(line=0.2);
// main file
use <../lib.scad>
use <s/3010s01.scad>
function ldraw_lib__3010py6() = [
// 0 Brick  1 x  4 with Metallic Silver Crossed Stripes, Black and Blue Wing and White Triangle Pattern
// 0 Name: 3010py6.dat
// 0 Author: Vincent Messenet [Cheenzo]
// 0 !LDRAW_ORG Part UPDATE 2020-02
// 0 !LICENSE Licensed under CC BY 4.0 : see CAreadme.txt
// 
// 0 BFC CERTIFY CCW
  [0,"BFC","CERTIFY"],
  [0,"BFC","CCW"],
// 
// 0 !KEYWORDS Brickheadz, BrickLink 3010pb264, Emmet, Lego Movie
// 0 !KEYWORDS Rebrickable 3010pr0065, Set 41634
// 
// 0 !HISTORY 2020-09-05 [PTadmin] Official Update 2020-02
// 
// 
// 1 16 0 0 0 1 0 0 0 1 0 0 0 1 s\3010s01.dat
  [1,16,0,0,0,1,0,0,0,1,0,0,0,1, ldraw_lib__s__3010s01()],
// 
// 3 80 -39.5 16.25 -10 -39.5 23.5 -10 -29.75 16.25 -10
  [3,80,-39.5,16.25,-10,-39.5,23.5,-10,-29.75,16.25,-10],
// 3 80 -29.75 16.25 -10 -39.5 23.5 -10 -22.25 16.25 -10
  [3,80,-29.75,16.25,-10,-39.5,23.5,-10,-22.25,16.25,-10],
// 4 80 -6.541 16.25 -10 -22.25 16.25 -10 -39.5 23.5 -10 0 23.5 -10
  [4,80,-6.541,16.25,-10,-22.25,16.25,-10,-39.5,23.5,-10,0,23.5,-10],
// 4 80 22.25 16.25 -10 6.541 16.25 -10 0 23.5 -10 39.5 23.5 -10
  [4,80,22.25,16.25,-10,6.541,16.25,-10,0,23.5,-10,39.5,23.5,-10],
// 3 80 29.75 16.25 -10 22.25 16.25 -10 39.5 23.5 -10
  [3,80,29.75,16.25,-10,22.25,16.25,-10,39.5,23.5,-10],
// 3 80 29.75 16.25 -10 39.5 23.5 -10 39.5 16.25 -10
  [3,80,29.75,16.25,-10,39.5,23.5,-10,39.5,16.25,-10],
// 4 80 -29.75 .5 -10 -29.75 16.25 -10 -22.25 16.25 -10 -22.25 .5 -10
  [4,80,-29.75,.5,-10,-29.75,16.25,-10,-22.25,16.25,-10,-22.25,.5,-10],
// 4 80 22.25 .5 -10 22.25 16.25 -10 29.75 16.25 -10 29.75 .5 -10
  [4,80,22.25,.5,-10,22.25,16.25,-10,29.75,16.25,-10,29.75,.5,-10],
// 3 15 -18.25 .5 -10 0 9.75 -10 18.25 .5 -10
  [3,15,-18.25,.5,-10,0,9.75,-10,18.25,.5,-10],
// 3 1 -5.178 8.488 -10 -17.25 2.5 -10 -8.643 11.993 -10
  [3,1,-5.178,8.488,-10,-17.25,2.5,-10,-8.643,11.993,-10],
// 3 1 -3.75 17.375 -10 -3.75 11.67 -10 -7.857 12.857 -10
  [3,1,-3.75,17.375,-10,-3.75,11.67,-10,-7.857,12.857,-10],
// 4 1 -7.857 12.857 -10 -3.75 11.67 -10 -1.29 10.421 -10 -4.056 9.056 -10
  [4,1,-7.857,12.857,-10,-3.75,11.67,-10,-1.29,10.421,-10,-4.056,9.056,-10],
// 4 1 -2.5 12.375 -10 -2.5 18.75 -10 0 21.5 -10 4.056 9.056 -10
  [4,1,-2.5,12.375,-10,-2.5,18.75,-10,0,21.5,-10,4.056,9.056,-10],
// 3 1 0 21.5 -10 7.857 12.857 -10 4.056 9.056 -10
  [3,1,0,21.5,-10,7.857,12.857,-10,4.056,9.056,-10],
// 3 1 5.178 8.488 -10 8.643 11.993 -10 17.5 2.25 -10
  [3,1,5.178,8.488,-10,8.643,11.993,-10,17.5,2.25,-10],
// 4 0 -5.178 8.488 -10 -18.25 .5 -10 -20.75 .5 -10 -17.25 2.5 -10
  [4,0,-5.178,8.488,-10,-18.25,.5,-10,-20.75,.5,-10,-17.25,2.5,-10],
// 3 0 -17.25 2.5 -10 -20.75 .5 -10 -8.643 11.993 -10
  [3,0,-17.25,2.5,-10,-20.75,.5,-10,-8.643,11.993,-10],
// 4 0 -7.857 12.857 -10 -8.643 11.993 -10 -20.75 .5 -10 -6.541 16.25 -10
  [4,0,-7.857,12.857,-10,-8.643,11.993,-10,-20.75,.5,-10,-6.541,16.25,-10],
// 3 0 -7.857 12.857 -10 -6.541 16.25 -10 -3.75 17.375 -10
  [3,0,-7.857,12.857,-10,-6.541,16.25,-10,-3.75,17.375,-10],
// 4 0 -2.5 18.75 -10 -3.75 17.375 -10 -6.541 16.25 -10 0 23.5 -10
  [4,0,-2.5,18.75,-10,-3.75,17.375,-10,-6.541,16.25,-10,0,23.5,-10],
// 3 0 0 23.5 -10 0 21.5 -10 -2.5 18.75 -10
  [3,0,0,23.5,-10,0,21.5,-10,-2.5,18.75,-10],
// 4 0 0 21.5 -10 0 23.5 -10 6.541 16.25 -10 7.857 12.857 -10
  [4,0,0,21.5,-10,0,23.5,-10,6.541,16.25,-10,7.857,12.857,-10],
// 4 0 8.643 11.993 -10 7.857 12.857 -10 6.541 16.25 -10 20.75 .5 -10
  [4,0,8.643,11.993,-10,7.857,12.857,-10,6.541,16.25,-10,20.75,.5,-10],
// 3 0 17.5 2.25 -10 8.643 11.993 -10 20.75 .5 -10
  [3,0,17.5,2.25,-10,8.643,11.993,-10,20.75,.5,-10],
// 4 0 20.75 .5 -10 18.25 .5 -10 5.178 8.488 -10 17.5 2.25 -10
  [4,0,20.75,.5,-10,18.25,.5,-10,5.178,8.488,-10,17.5,2.25,-10],
// 4 0 4.056 9.056 -10 5.178 8.488 -10 18.25 .5 -10 0 9.75 -10
  [4,0,4.056,9.056,-10,5.178,8.488,-10,18.25,.5,-10,0,9.75,-10],
// 4 0 -2.5 12.375 -10 4.056 9.056 -10 0 9.75 -10 -1.29 10.421 -10
  [4,0,-2.5,12.375,-10,4.056,9.056,-10,0,9.75,-10,-1.29,10.421,-10],
// 3 0 -1.29 10.421 -10 0 9.75 -10 -4.056 9.056 -10
  [3,0,-1.29,10.421,-10,0,9.75,-10,-4.056,9.056,-10],
// 4 0 -5.178 8.488 -10 -4.056 9.056 -10 0 9.75 -10 -18.25 .5 -10
  [4,0,-5.178,8.488,-10,-4.056,9.056,-10,0,9.75,-10,-18.25,.5,-10],
// 3 0 -2.5 12.375 -10 -1.29 10.421 -10 -3.75 11.67 -10
  [3,0,-2.5,12.375,-10,-1.29,10.421,-10,-3.75,11.67,-10],
// 4 0 -4.056 9.056 -10 -5.178 8.488 -10 -8.643 11.993 -10 -7.857 12.857 -10
  [4,0,-4.056,9.056,-10,-5.178,8.488,-10,-8.643,11.993,-10,-7.857,12.857,-10],
// 4 0 -3.75 11.67 -10 -3.75 17.375 -10 -2.5 18.75 -10 -2.5 12.375 -10
  [4,0,-3.75,11.67,-10,-3.75,17.375,-10,-2.5,18.75,-10,-2.5,12.375,-10],
// 4 0 8.643 11.993 -10 5.178 8.488 -10 4.056 9.056 -10 7.857 12.857 -10
  [4,0,8.643,11.993,-10,5.178,8.488,-10,4.056,9.056,-10,7.857,12.857,-10],
// 3 16 -40 0 -10 -29.75 .5 -10 -22.25 .5 -10
  [3,16,-40,0,-10,-29.75,.5,-10,-22.25,.5,-10],
// 3 16 -40 0 -10 -22.25 .5 -10 -20.75 .5 -10
  [3,16,-40,0,-10,-22.25,.5,-10,-20.75,.5,-10],
// 3 16 -40 0 -10 -20.75 .5 -10 -18.25 .5 -10
  [3,16,-40,0,-10,-20.75,.5,-10,-18.25,.5,-10],
// 4 16 -40 0 -10 -18.25 .5 -10 18.25 .5 -10 40 0 -10
  [4,16,-40,0,-10,-18.25,.5,-10,18.25,.5,-10,40,0,-10],
// 3 16 18.25 .5 -10 20.75 .5 -10 40 0 -10
  [3,16,18.25,.5,-10,20.75,.5,-10,40,0,-10],
// 3 16 40 0 -10 20.75 .5 -10 22.25 .5 -10
  [3,16,40,0,-10,20.75,.5,-10,22.25,.5,-10],
// 3 16 40 0 -10 22.25 .5 -10 29.75 .5 -10
  [3,16,40,0,-10,22.25,.5,-10,29.75,.5,-10],
// 4 16 40 0 -10 29.75 .5 -10 29.75 16.25 -10 39.5 16.25 -10
  [4,16,40,0,-10,29.75,.5,-10,29.75,16.25,-10,39.5,16.25,-10],
// 4 16 39.5 16.25 -10 39.5 23.5 -10 40 24 -10 40 0 -10
  [4,16,39.5,16.25,-10,39.5,23.5,-10,40,24,-10,40,0,-10],
// 4 16 40 24 -10 39.5 23.5 -10 0 23.5 -10 -40 24 -10
  [4,16,40,24,-10,39.5,23.5,-10,0,23.5,-10,-40,24,-10],
// 3 16 -39.5 23.5 -10 -40 24 -10 0 23.5 -10
  [3,16,-39.5,23.5,-10,-40,24,-10,0,23.5,-10],
// 4 16 -40 24 -10 -39.5 23.5 -10 -39.5 16.25 -10 -40 0 -10
  [4,16,-40,24,-10,-39.5,23.5,-10,-39.5,16.25,-10,-40,0,-10],
// 4 16 -29.75 .5 -10 -40 0 -10 -39.5 16.25 -10 -29.75 16.25 -10
  [4,16,-29.75,.5,-10,-40,0,-10,-39.5,16.25,-10,-29.75,16.25,-10],
// 4 16 -6.541 16.25 -10 -20.75 .5 -10 -22.25 .5 -10 -22.25 16.25 -10
  [4,16,-6.541,16.25,-10,-20.75,.5,-10,-22.25,.5,-10,-22.25,16.25,-10],
// 4 16 6.541 16.25 -10 22.25 16.25 -10 22.25 .5 -10 20.75 .5 -10
  [4,16,6.541,16.25,-10,22.25,16.25,-10,22.25,.5,-10,20.75,.5,-10],
];
module ldraw_lib__3010py6(step=0, col=false, unit=2/5, alt=false, line=0.2, solid=!$preview)
    makepoly(ldraw_lib__3010py6(), step=step, col=col, unit=unit, alt=alt, line=line, solid=solid);
ldraw_lib__3010py6(line=0.2);
